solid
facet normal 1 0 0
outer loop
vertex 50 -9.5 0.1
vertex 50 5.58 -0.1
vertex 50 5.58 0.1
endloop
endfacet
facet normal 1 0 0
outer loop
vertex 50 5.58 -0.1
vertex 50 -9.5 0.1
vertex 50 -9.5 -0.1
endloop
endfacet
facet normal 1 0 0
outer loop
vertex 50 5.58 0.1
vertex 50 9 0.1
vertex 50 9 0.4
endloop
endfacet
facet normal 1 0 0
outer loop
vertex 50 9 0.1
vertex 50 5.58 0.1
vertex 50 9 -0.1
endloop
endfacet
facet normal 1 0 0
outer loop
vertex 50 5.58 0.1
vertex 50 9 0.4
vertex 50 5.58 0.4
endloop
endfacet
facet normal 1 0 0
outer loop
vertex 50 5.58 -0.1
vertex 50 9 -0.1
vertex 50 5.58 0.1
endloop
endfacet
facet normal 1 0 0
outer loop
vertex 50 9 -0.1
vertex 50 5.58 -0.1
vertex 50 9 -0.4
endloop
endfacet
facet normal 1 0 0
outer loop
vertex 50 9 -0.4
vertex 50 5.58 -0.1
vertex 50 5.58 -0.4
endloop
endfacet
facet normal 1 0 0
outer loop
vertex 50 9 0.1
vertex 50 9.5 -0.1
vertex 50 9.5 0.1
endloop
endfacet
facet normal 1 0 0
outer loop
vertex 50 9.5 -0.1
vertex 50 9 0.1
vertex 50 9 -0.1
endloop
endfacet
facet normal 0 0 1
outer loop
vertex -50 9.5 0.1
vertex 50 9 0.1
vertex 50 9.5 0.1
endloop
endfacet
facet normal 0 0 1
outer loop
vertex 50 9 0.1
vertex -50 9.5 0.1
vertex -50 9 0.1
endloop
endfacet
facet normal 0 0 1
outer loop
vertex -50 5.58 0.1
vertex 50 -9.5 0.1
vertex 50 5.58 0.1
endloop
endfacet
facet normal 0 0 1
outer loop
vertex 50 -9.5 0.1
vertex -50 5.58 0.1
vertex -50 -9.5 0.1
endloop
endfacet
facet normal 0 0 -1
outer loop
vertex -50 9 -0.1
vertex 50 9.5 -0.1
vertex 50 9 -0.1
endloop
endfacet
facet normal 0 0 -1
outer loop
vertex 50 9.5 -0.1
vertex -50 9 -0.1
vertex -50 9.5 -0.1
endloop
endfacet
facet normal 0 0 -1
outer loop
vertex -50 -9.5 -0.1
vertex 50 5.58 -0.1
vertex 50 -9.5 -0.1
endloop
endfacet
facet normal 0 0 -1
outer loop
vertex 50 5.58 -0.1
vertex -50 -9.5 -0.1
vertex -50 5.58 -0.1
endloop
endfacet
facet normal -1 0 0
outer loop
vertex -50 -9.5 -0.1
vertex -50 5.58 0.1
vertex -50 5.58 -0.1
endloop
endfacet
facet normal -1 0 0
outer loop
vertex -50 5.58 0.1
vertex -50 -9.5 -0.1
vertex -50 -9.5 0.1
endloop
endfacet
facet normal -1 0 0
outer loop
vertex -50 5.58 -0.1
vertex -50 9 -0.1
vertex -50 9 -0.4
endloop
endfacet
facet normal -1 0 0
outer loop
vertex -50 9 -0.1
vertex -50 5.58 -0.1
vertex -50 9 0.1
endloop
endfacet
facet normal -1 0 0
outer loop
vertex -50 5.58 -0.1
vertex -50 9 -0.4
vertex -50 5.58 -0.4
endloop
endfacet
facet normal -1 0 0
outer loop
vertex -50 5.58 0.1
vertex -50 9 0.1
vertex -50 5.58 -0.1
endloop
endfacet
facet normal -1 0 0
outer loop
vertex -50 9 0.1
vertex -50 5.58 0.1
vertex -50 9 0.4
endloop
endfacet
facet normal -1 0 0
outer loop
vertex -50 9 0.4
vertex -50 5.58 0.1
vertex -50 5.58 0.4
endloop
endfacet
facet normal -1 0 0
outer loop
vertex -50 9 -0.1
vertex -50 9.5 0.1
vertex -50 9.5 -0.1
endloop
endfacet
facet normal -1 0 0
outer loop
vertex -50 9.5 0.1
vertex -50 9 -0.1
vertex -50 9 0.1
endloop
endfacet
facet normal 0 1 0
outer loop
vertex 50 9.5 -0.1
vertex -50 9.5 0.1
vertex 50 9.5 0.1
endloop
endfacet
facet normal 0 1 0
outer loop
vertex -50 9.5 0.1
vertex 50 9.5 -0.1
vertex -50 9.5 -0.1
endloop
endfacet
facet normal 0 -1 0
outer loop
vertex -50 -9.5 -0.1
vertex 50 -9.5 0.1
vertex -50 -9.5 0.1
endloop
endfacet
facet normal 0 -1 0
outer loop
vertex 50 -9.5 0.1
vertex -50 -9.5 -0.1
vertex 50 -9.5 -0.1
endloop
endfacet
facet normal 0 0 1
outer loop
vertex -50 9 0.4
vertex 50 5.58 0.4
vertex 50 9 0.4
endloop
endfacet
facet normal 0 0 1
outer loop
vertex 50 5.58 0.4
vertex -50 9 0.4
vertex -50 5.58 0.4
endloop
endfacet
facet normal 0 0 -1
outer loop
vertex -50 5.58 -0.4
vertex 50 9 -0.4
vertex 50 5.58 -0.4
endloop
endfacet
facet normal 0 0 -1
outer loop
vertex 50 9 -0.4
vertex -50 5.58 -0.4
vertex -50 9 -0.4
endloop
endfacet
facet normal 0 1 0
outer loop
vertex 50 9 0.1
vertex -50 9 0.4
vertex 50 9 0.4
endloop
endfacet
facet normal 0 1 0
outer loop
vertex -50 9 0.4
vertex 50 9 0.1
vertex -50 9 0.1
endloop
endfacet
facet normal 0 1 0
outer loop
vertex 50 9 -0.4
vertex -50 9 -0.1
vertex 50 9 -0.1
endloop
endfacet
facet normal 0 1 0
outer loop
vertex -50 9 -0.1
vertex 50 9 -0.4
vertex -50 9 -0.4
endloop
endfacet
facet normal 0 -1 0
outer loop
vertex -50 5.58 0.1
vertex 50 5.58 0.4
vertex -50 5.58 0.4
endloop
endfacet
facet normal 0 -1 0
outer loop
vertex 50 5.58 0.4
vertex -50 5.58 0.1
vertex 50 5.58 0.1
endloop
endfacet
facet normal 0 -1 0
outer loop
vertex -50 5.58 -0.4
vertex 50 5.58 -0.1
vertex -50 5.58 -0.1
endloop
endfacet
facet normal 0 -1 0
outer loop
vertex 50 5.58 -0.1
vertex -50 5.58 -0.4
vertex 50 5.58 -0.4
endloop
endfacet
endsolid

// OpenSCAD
// Sellotape tape SHEET (one connected solid)
// Replaces roll/ring with a thin rectangular sheet to match: "A sheet: Sellotape tape"

tape_length    = 100;   //[50:200:1]   // sheet length
tape_width     = 19;    //[10:38:1]    // sheet width
tape_thickness = 0.05;  //[0.02:0.2:0.01] // sheet thickness (visual)

$fn = 80;

// Ensure printable/visible minimums while keeping proportions
L = max(50, tape_length);
W = max(10, tape_width);
T = max(0.2, tape_thickness);   // give the "sheet" real thickness for a solid model

// Small overlap to guarantee single-solid connectivity between layers
overlap = 1.0;

// Simple "Sellotape sheet" look: a thin tape layer + a slightly thicker backing edge,
// fused together (single union) with overlap.
module sellotape_sheet(){
    union() {
        // Main tape sheet
        color([0.88, 0.88, 0.82])
        cube([L, W, T], center=true);

        // Slightly thicker "edge/backing" strip along one long side (still one solid)
        // Positioned by formula so it touches/overlaps the main sheet.
        backing_w = max(2, W*0.18);
        backing_t = T + 0.6; // subtle thickness cue
        translate([0, (W/2 - backing_w/2) - overlap/2, 0])
            color([0.92, 0.90, 0.85])
            cube([L, backing_w, backing_t], center=true);
    }
}

sellotape_sheet();
